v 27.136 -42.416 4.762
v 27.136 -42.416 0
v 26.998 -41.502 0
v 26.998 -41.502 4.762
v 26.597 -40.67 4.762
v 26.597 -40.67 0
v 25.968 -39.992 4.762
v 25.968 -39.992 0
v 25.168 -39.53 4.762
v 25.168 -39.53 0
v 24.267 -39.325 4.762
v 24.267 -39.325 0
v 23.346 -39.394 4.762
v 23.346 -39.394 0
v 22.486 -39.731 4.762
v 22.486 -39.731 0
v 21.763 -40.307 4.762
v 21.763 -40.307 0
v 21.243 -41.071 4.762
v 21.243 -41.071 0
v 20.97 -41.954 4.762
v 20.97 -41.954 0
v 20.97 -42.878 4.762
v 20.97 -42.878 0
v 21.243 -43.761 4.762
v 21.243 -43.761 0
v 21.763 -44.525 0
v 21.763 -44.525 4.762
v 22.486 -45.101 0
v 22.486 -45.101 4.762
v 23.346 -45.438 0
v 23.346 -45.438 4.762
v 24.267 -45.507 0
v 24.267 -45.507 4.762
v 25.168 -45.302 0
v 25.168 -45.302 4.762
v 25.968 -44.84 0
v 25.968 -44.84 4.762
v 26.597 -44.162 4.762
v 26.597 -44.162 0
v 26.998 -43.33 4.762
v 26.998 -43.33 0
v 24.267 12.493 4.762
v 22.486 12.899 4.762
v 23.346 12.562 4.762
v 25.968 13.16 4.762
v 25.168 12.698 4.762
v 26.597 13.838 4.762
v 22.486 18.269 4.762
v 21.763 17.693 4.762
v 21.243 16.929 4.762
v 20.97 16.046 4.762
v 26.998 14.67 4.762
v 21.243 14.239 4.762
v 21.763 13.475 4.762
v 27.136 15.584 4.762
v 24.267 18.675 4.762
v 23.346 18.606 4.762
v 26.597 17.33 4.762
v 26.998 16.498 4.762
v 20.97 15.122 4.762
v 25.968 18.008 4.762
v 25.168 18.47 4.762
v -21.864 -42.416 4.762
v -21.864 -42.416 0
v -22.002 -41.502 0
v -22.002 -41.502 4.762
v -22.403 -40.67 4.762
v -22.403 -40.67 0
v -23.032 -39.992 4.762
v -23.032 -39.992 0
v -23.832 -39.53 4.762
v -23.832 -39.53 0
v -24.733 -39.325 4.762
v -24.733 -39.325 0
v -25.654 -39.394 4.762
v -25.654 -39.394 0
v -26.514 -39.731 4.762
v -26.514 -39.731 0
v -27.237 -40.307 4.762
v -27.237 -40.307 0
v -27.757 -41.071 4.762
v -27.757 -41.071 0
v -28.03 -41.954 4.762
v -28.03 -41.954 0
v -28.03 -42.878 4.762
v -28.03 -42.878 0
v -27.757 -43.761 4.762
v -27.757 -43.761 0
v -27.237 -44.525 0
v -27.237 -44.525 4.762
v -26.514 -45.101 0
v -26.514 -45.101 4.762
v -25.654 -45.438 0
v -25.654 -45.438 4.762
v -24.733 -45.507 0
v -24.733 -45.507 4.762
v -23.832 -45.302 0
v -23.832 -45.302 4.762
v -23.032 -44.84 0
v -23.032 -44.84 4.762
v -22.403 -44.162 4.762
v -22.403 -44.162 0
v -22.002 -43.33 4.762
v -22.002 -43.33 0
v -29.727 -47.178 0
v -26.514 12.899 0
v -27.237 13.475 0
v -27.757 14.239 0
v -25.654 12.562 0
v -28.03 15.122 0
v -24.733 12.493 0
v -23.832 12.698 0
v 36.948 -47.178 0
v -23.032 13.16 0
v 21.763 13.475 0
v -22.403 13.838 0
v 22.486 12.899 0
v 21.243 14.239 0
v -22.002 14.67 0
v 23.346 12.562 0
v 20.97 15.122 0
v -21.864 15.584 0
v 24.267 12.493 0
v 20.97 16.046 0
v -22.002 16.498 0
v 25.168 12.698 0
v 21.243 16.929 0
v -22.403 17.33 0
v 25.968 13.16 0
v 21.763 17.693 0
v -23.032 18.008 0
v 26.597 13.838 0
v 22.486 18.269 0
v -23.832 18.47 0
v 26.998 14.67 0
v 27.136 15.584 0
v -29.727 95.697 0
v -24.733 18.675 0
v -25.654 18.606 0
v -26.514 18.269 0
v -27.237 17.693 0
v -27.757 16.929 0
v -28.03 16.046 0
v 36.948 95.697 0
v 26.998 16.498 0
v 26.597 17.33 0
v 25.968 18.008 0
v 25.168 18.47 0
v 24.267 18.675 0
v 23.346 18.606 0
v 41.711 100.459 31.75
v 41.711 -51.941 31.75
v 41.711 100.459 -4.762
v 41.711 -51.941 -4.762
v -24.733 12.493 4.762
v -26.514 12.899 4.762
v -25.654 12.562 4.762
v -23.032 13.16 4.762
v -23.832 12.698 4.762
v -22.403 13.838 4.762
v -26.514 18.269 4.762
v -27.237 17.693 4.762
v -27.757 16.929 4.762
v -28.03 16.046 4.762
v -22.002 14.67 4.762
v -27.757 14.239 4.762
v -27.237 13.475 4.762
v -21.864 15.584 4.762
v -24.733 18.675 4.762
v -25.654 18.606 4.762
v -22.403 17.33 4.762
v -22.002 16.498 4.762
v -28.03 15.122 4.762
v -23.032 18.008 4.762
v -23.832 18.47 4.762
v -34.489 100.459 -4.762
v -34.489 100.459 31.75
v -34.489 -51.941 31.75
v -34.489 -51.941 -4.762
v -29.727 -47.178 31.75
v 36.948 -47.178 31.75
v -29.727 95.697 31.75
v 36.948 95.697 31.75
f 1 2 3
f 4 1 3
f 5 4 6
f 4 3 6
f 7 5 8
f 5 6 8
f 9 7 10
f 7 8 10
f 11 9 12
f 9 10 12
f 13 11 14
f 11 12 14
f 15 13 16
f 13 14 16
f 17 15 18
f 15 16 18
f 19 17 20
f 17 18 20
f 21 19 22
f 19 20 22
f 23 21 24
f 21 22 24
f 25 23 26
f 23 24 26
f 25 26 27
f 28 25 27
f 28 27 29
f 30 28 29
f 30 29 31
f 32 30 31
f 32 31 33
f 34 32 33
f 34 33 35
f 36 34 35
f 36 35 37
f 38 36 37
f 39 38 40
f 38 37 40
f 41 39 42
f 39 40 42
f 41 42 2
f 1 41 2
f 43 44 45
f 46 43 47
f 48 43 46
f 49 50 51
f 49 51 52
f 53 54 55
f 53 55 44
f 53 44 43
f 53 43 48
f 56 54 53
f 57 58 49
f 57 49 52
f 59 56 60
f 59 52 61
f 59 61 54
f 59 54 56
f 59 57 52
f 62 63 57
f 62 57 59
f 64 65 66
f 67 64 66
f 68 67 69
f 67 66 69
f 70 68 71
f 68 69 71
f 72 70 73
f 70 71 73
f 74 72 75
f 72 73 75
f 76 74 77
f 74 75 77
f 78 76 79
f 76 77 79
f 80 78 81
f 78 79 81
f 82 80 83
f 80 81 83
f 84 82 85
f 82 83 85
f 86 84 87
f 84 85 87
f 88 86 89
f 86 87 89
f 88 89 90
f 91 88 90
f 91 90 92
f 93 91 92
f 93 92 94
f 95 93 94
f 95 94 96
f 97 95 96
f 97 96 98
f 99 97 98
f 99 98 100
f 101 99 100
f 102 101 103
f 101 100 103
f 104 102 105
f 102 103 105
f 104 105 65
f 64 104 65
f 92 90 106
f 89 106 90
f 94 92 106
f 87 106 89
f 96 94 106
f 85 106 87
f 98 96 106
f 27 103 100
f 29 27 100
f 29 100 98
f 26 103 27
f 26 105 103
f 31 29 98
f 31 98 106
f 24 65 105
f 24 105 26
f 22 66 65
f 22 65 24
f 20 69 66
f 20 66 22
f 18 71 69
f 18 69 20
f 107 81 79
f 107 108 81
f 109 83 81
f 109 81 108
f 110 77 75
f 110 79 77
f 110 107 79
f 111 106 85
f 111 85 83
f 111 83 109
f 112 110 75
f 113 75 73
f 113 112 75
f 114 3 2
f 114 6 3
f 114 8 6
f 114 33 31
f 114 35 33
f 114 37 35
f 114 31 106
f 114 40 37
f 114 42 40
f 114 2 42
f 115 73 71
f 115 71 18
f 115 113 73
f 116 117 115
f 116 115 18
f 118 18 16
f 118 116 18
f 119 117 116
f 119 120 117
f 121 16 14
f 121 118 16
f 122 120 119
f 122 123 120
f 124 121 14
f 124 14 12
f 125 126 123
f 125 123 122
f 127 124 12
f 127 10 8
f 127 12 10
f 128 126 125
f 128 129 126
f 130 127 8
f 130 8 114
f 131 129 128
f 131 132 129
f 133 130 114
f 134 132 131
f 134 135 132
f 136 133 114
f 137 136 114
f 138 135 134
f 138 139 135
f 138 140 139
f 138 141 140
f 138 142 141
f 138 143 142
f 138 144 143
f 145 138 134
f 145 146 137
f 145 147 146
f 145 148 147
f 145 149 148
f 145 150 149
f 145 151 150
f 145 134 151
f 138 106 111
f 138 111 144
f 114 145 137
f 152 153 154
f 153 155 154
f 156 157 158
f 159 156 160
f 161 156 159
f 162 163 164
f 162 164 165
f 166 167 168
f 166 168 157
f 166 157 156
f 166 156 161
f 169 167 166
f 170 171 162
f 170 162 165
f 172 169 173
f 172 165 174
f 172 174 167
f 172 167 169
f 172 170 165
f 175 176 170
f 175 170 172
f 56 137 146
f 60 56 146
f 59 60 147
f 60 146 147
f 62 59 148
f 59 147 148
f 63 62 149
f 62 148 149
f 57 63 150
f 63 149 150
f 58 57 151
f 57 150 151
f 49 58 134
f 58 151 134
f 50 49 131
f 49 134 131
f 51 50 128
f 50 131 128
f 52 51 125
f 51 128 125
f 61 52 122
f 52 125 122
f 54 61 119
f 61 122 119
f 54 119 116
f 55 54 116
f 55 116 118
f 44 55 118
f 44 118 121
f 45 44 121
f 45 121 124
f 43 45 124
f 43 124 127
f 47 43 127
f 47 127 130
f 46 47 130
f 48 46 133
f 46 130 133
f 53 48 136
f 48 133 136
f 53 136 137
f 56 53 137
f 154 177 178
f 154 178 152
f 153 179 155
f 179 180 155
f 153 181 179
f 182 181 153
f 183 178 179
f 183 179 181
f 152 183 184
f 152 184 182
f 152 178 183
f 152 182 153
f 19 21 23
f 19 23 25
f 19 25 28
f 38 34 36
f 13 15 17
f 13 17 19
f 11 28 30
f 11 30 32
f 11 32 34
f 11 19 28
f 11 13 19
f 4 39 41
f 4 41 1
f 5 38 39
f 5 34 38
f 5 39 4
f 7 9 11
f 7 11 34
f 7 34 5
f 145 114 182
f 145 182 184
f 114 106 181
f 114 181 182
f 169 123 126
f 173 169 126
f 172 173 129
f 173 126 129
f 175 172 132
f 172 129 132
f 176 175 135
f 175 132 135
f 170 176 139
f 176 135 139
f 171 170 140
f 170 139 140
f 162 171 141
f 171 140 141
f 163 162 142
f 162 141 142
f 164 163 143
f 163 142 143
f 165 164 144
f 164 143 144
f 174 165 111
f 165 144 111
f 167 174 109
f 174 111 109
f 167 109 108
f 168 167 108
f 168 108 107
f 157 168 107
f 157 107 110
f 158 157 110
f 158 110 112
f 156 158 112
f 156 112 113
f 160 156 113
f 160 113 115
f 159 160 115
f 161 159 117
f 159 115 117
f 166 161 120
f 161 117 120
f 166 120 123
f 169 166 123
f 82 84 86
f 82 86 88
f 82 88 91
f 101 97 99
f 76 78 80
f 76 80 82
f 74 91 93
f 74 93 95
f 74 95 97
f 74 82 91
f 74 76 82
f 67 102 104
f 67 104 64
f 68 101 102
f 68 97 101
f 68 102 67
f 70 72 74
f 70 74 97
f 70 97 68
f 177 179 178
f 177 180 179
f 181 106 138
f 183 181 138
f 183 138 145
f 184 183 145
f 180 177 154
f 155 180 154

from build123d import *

# Parameters (mm, degrees)
F0_W     = 76.2
F0_H     = 152.4
F0_W_2   = 66.675
F0_H_2   = 142.875
F0_R     = 3.1
F1_DEPTH = 4.7625
F2_DEPTH = 31.75
F3_DEPTH = 25.4
F4_DEPTH = 4.7625


with BuildPart() as f1:
    # F0 (on Top) → F1 (new body)
    with BuildSketch(Plane.XY):
        with Locations((3.610619, 24.259033)):
            Rectangle(F0_W, F0_H)
        with Locations((3.610619, 24.259033)):
            Rectangle(F0_W_2, F0_H_2, mode=Mode.SUBTRACT)
        with Locations((3.610619, 24.259033)):
            Rectangle(F0_W_2, F0_H_2)
        with BuildLine():
            ThreePointArc((-28.464381, 36.084033), (-27.585701, 38.205353), (-25.464381, 39.084033))
            Line((-25.464381, 39.084033), (24.535619, 39.084033))
            ThreePointArc((24.535619, 39.084033), (26.65694, 38.205353), (27.535619, 36.084033))
            Line((27.535619, 36.084033), (27.535619, -42.915967))
            ThreePointArc((27.535619, -42.915967), (26.65694, -45.037288), (24.535619, -45.915967))
            Line((24.535619, -45.915967), (-25.464381, -45.915967))
            ThreePointArc((-25.464381, -45.915967), (-27.585701, -45.037288), (-28.464381, -42.915967))
            Line((-28.464381, -42.915967), (-28.464381, 36.084033))
        make_face(mode=Mode.SUBTRACT)
        with BuildLine():
            Line((24.535619, 39.084033), (-25.464381, 39.084033))
            ThreePointArc((-25.464381, 39.084033), (-27.585701, 38.205353), (-28.464381, 36.084033))
            Line((-28.464381, 36.084033), (-28.464381, -42.915967))
            ThreePointArc((-28.464381, -42.915967), (-27.585701, -45.037288), (-25.464381, -45.915967))
            Line((-25.464381, -45.915967), (24.535619, -45.915967))
            ThreePointArc((24.535619, -45.915967), (26.65694, -45.037288), (27.535619, -42.915967))
            Line((27.535619, -42.915967), (27.535619, 36.084033))
            ThreePointArc((27.535619, 36.084033), (26.65694, 38.205353), (24.535619, 39.084033))
        make_face()
        with Locations((-24.964381, -42.415967)):
            Circle(F0_R, mode=Mode.SUBTRACT)
        with Locations((-24.964381, 15.584033)):
            Circle(F0_R, mode=Mode.SUBTRACT)
        with Locations((24.035619, -42.415967)):
            Circle(F0_R, mode=Mode.SUBTRACT)
        with Locations((24.035619, 15.584033)):
            Circle(F0_R, mode=Mode.SUBTRACT)
        with Locations((24.035619, 15.584033)):
            Circle(F0_R)
        with Locations((24.035619, -42.415967)):
            Circle(F0_R)
        with Locations((-24.964381, -42.415967)):
            Circle(F0_R)
        with Locations((-24.964381, 15.584033)):
            Circle(F0_R)
    extrude(amount=-F1_DEPTH)

    # F0 (on Top) → F2 (join)
    with BuildSketch(Plane.XY):
        with Locations((3.610619, 24.259033)):
            Rectangle(F0_W, F0_H)
        with Locations((3.610619, 24.259033)):
            Rectangle(F0_W_2, F0_H_2, mode=Mode.SUBTRACT)
    extrude(amount=F2_DEPTH)

    # F0 (on Top) → F3 (join)
    with BuildSketch(Plane.XY):
        with Locations((3.610619, 24.259033)):
            Rectangle(F0_W, F0_H)
        with Locations((3.610619, 24.259033)):
            Rectangle(F0_W_2, F0_H_2, mode=Mode.SUBTRACT)
    extrude(amount=F3_DEPTH)

    # F0 (on Top) → F4 (join)
    with BuildSketch(Plane.XY):
        with Locations((24.035619, 15.584033)):
            Circle(F0_R)
        with Locations((24.035619, -42.415967)):
            Circle(F0_R)
        with Locations((-24.964381, -42.415967)):
            Circle(F0_R)
        with Locations((-24.964381, 15.584033)):
            Circle(F0_R)
    extrude(amount=F4_DEPTH)


solid = f1.part
